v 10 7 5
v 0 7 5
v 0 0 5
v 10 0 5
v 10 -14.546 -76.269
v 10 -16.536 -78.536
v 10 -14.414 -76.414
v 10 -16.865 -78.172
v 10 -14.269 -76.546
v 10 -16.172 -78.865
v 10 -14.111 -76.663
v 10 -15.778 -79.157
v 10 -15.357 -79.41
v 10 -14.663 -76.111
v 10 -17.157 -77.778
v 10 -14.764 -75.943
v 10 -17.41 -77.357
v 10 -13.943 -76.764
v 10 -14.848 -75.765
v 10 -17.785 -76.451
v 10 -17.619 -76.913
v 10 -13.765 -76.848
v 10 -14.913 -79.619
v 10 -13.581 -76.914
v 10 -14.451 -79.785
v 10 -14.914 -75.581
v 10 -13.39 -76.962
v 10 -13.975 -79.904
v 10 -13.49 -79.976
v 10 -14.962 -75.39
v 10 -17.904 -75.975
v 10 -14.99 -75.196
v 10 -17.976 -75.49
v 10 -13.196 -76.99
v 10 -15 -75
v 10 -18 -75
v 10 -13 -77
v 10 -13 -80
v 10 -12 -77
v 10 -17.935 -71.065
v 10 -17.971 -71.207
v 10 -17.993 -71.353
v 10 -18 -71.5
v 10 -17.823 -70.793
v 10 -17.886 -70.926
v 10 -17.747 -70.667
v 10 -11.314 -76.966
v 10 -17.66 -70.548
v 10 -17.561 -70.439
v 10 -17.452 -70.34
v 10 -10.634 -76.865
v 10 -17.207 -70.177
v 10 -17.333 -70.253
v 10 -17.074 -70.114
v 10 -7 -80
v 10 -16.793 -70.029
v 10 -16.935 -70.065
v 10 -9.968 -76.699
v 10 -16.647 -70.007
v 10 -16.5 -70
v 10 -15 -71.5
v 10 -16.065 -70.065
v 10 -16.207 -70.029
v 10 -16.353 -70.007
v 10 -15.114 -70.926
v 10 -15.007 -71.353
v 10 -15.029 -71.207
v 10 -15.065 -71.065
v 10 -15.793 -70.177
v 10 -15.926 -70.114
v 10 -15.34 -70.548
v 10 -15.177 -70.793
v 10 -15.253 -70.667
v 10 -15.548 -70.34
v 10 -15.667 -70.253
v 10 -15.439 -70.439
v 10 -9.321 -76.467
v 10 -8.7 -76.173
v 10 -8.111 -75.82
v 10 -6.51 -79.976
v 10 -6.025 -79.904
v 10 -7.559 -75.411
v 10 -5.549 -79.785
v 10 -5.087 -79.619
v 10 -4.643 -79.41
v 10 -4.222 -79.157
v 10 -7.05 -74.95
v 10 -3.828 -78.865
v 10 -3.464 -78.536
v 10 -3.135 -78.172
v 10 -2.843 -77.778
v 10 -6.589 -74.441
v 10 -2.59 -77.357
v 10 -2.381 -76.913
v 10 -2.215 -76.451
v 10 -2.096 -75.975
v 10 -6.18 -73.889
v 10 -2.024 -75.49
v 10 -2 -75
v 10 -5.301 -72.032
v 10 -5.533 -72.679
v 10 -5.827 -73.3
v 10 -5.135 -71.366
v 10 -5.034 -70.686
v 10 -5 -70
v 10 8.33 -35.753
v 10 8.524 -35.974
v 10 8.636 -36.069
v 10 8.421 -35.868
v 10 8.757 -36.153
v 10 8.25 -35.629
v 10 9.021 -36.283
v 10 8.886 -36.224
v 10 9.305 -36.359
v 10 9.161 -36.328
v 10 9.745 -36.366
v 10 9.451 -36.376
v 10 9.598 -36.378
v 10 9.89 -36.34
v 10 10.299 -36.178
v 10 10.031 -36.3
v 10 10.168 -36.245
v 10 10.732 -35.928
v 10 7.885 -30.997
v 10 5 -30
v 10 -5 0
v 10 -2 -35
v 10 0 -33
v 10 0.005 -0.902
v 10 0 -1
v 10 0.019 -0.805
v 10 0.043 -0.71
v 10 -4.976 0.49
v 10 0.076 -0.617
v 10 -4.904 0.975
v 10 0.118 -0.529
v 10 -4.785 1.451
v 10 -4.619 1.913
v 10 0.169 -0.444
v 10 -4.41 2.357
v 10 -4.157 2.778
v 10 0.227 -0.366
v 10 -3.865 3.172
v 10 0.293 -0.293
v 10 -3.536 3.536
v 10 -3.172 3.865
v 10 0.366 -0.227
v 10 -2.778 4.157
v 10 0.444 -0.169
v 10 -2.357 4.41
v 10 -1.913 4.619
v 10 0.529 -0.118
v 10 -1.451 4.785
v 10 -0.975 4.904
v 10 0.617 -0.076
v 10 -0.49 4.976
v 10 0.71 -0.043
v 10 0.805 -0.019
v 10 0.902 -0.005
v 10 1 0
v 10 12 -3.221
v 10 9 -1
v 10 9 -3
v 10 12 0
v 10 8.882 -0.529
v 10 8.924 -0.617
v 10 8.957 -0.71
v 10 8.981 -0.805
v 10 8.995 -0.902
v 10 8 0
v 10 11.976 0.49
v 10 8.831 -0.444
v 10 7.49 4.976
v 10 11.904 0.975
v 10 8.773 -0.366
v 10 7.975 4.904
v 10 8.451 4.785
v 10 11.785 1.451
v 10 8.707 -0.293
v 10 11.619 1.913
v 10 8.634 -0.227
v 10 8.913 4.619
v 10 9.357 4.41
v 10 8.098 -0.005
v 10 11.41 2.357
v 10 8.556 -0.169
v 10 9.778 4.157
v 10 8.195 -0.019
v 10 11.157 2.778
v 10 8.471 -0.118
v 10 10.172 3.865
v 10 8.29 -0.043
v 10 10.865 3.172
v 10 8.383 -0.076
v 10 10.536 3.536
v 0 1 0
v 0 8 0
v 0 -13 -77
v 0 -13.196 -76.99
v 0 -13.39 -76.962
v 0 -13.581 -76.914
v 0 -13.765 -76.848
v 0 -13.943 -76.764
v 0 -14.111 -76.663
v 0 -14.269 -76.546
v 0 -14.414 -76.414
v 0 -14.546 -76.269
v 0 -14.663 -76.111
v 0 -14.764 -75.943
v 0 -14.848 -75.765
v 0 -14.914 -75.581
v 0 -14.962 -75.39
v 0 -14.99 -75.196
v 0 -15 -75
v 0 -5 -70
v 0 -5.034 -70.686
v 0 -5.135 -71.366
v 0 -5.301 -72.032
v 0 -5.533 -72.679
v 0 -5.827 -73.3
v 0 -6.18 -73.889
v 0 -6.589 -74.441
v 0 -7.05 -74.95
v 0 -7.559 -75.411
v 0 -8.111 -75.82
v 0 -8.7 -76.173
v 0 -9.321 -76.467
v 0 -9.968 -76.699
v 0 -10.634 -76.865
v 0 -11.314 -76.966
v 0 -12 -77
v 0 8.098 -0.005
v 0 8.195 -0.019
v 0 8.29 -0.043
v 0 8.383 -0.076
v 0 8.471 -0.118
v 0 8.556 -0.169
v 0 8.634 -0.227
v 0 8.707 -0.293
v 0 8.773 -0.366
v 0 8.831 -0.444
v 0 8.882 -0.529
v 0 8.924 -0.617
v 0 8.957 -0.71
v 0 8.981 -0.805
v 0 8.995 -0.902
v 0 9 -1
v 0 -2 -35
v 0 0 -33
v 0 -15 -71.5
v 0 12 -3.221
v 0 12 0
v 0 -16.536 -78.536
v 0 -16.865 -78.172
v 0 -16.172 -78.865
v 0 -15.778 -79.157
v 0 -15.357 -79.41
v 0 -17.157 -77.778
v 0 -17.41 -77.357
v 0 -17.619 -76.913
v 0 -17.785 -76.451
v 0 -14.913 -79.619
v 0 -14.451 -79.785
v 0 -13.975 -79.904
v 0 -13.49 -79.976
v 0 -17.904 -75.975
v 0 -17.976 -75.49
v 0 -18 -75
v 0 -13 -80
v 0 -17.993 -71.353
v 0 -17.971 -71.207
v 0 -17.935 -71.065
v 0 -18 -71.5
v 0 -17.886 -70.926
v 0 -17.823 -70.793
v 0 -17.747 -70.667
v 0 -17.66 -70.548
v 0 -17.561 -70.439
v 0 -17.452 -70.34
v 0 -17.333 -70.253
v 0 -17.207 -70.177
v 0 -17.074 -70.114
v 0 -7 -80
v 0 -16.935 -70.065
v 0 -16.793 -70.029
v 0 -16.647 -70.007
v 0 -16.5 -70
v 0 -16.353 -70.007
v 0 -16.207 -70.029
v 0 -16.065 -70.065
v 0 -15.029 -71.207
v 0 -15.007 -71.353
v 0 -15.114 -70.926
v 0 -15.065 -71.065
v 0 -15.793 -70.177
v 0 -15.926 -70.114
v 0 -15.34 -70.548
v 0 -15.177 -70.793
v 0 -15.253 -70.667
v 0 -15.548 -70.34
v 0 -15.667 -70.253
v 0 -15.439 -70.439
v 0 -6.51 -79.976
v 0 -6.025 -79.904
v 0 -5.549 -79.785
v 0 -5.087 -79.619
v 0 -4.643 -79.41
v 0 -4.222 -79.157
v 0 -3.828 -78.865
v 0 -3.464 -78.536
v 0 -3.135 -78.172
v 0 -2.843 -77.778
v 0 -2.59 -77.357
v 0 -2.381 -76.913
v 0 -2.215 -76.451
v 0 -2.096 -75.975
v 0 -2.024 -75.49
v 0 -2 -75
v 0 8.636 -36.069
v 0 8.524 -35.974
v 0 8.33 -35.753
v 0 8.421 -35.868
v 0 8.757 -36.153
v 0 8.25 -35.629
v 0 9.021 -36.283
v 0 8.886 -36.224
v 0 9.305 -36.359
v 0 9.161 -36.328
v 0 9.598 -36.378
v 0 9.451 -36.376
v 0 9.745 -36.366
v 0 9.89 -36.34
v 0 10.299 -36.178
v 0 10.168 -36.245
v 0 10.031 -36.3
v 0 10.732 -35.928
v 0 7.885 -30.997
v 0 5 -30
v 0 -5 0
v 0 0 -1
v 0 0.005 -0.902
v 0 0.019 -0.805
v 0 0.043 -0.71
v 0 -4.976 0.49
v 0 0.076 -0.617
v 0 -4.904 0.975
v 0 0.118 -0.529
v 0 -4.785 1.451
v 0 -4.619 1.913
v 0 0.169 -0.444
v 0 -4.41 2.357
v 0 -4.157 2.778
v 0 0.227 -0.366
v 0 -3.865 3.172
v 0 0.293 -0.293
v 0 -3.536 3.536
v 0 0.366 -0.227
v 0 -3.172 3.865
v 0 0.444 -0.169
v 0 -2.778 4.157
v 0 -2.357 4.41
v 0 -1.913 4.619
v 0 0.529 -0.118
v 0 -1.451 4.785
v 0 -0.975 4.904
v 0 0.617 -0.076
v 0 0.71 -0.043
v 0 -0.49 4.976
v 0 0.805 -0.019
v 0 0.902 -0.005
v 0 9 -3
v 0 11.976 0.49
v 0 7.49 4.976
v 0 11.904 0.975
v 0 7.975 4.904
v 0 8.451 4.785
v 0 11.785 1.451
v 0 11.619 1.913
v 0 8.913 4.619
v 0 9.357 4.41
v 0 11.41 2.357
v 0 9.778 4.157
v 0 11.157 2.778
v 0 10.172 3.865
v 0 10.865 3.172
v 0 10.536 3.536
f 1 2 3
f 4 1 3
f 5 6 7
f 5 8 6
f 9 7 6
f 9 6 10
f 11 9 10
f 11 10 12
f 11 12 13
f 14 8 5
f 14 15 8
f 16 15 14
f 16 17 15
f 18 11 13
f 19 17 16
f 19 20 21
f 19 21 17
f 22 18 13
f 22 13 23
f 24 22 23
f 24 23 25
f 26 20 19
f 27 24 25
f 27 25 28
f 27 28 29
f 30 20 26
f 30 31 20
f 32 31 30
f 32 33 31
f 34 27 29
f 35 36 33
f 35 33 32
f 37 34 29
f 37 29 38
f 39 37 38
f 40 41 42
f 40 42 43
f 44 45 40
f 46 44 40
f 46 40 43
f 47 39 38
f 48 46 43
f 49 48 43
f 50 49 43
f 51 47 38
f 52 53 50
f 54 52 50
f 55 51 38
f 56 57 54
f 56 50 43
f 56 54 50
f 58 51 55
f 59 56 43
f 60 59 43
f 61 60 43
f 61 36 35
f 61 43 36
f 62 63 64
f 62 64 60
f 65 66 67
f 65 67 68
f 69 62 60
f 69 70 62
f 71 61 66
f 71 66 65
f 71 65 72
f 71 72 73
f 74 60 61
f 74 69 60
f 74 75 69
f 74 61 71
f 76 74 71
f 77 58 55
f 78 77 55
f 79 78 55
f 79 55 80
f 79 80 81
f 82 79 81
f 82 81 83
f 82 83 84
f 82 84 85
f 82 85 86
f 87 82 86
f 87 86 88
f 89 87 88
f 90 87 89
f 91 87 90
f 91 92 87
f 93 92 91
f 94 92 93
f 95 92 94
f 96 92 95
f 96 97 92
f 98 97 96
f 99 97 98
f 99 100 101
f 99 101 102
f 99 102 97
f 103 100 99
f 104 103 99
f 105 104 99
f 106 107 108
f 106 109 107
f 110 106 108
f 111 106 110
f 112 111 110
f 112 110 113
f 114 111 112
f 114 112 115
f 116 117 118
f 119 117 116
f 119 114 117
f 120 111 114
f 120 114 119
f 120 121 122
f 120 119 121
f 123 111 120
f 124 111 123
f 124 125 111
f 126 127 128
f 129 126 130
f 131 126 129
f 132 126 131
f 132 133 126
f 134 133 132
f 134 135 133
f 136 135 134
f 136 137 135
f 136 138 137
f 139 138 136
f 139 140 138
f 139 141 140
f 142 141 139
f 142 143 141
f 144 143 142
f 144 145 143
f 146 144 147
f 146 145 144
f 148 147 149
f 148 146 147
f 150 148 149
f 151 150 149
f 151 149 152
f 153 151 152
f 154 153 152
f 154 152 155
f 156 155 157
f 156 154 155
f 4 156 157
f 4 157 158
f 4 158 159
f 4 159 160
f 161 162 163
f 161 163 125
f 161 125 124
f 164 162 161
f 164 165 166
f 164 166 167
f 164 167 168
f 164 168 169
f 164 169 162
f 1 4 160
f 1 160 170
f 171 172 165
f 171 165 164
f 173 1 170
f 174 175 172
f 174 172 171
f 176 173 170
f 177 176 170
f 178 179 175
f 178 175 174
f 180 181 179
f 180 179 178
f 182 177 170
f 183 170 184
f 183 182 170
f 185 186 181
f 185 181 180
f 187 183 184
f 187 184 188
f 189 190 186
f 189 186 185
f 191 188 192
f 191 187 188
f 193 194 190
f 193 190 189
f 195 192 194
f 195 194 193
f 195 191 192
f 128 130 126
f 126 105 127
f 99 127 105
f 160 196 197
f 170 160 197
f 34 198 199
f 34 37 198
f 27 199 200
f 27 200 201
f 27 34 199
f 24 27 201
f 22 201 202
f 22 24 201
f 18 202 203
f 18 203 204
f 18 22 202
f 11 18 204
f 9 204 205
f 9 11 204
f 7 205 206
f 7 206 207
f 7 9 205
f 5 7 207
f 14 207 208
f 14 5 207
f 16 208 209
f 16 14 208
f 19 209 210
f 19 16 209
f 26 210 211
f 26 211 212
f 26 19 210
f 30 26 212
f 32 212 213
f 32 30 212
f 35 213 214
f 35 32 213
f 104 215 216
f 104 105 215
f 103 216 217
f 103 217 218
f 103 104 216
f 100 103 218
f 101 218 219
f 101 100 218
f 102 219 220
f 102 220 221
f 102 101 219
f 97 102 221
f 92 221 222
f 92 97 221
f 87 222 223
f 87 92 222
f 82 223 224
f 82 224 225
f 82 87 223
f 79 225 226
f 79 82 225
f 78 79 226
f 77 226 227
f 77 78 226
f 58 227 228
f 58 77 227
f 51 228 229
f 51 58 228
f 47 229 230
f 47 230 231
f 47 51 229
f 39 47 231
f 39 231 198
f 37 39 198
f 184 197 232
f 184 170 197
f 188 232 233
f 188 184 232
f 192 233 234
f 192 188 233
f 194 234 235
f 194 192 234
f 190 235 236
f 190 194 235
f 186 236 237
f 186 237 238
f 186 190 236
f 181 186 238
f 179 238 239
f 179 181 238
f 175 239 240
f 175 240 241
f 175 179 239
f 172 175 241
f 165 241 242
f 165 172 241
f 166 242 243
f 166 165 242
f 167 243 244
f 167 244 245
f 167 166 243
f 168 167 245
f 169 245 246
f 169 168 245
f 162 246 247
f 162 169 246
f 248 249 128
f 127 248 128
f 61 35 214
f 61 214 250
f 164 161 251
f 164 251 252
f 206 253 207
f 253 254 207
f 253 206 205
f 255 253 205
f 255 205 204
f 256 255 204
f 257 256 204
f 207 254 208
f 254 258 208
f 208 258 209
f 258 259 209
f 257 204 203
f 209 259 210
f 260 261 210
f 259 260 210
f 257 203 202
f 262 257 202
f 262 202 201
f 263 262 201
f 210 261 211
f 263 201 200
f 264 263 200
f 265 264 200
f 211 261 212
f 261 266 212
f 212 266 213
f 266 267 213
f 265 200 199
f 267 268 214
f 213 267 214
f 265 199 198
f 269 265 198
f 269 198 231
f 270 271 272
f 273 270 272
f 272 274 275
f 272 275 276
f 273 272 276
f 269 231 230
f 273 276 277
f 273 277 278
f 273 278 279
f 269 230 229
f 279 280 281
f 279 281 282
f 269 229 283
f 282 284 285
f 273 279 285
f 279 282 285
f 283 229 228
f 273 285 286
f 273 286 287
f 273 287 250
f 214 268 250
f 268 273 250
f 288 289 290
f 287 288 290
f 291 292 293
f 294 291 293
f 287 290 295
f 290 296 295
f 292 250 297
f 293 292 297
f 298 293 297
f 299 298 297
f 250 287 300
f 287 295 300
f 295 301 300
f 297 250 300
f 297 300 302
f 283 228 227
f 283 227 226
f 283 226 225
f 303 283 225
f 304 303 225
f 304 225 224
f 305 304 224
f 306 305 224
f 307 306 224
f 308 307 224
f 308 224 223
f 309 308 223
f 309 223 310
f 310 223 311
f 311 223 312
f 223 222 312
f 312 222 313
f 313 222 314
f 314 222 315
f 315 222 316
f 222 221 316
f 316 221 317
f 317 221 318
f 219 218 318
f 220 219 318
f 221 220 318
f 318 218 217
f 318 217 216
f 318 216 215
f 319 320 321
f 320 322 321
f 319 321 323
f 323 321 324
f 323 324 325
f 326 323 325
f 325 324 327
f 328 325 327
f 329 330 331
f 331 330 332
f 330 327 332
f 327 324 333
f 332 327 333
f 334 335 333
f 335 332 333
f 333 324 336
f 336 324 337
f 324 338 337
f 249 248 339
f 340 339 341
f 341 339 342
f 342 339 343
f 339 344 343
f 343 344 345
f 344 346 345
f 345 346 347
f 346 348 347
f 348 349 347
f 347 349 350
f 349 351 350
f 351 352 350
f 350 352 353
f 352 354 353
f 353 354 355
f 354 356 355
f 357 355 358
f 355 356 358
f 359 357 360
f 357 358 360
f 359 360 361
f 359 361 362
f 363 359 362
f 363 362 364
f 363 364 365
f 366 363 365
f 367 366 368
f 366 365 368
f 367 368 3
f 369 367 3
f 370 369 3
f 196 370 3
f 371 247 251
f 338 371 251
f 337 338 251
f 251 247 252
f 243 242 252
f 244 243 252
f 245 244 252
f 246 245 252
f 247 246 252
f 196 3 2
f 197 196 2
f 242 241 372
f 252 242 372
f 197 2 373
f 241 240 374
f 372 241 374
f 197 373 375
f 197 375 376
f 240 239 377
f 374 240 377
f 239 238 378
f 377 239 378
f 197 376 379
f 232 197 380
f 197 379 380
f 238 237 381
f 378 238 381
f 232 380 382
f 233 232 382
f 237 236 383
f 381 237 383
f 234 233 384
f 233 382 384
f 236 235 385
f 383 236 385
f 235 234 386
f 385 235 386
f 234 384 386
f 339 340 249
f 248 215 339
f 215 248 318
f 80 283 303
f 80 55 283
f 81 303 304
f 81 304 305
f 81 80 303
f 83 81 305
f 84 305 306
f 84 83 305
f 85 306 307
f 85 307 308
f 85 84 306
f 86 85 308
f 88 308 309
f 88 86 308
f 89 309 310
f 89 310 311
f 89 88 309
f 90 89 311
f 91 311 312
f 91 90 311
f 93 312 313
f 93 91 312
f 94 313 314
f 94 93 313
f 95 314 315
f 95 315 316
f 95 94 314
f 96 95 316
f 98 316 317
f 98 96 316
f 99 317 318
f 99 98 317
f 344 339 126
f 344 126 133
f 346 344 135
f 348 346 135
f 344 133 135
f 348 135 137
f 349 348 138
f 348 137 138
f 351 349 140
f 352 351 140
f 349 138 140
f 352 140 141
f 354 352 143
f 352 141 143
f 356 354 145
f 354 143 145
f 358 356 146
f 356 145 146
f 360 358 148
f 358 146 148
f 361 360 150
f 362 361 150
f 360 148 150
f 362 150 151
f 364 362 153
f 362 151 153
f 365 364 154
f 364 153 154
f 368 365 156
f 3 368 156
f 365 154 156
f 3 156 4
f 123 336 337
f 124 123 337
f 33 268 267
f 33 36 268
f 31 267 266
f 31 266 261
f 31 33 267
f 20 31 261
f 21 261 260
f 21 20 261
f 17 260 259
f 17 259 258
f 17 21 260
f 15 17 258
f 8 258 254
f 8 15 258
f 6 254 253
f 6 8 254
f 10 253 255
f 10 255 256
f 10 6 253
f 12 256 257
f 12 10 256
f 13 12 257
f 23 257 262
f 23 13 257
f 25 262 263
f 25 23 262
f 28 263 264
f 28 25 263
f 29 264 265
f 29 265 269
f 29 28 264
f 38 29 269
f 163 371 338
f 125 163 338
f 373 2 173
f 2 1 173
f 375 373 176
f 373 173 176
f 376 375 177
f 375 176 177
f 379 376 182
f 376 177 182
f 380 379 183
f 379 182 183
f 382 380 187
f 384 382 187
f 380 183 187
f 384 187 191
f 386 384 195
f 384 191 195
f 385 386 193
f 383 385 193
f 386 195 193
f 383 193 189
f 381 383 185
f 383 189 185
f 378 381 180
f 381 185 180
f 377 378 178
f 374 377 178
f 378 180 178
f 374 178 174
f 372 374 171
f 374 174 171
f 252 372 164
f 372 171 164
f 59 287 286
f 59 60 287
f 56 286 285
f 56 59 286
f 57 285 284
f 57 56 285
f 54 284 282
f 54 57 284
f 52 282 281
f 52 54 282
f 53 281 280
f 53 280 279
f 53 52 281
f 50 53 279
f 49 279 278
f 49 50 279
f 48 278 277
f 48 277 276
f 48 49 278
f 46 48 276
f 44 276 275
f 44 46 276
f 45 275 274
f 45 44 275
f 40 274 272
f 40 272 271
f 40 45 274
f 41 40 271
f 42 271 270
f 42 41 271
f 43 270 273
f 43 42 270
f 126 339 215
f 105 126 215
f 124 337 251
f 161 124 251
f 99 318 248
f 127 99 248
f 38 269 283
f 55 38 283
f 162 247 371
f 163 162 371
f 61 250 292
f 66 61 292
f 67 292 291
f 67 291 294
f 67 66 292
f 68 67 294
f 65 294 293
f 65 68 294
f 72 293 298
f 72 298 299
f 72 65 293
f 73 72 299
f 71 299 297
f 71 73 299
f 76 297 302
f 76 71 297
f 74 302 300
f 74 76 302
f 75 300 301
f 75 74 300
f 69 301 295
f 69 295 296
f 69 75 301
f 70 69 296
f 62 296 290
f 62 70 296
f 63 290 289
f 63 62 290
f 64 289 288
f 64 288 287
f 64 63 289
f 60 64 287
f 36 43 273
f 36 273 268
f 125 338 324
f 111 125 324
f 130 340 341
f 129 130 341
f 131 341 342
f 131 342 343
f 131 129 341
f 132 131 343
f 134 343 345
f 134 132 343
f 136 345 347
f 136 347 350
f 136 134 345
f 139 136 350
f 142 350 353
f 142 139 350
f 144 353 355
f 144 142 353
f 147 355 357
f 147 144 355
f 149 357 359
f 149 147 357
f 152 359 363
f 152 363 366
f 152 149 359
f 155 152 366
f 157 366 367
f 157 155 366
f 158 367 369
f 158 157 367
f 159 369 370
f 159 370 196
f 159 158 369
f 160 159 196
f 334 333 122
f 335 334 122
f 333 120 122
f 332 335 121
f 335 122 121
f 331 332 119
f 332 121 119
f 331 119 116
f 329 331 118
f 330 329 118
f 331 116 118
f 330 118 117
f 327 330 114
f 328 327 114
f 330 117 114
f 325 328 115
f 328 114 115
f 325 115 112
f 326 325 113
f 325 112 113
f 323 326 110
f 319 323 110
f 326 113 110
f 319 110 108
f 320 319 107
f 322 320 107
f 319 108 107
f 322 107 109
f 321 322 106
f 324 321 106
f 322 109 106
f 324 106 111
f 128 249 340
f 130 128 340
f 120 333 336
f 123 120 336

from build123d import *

# Parameters (mm, degrees)
F1_DEPTH = 10
F2_R     = 7
F3_R     = 2
F4_R     = 5
F5_R     = 1.49999
F6_SIZE  = 1.99999
F7_R     = 1


# Not quite as in the source:
# - a fillet or chamfer is up to 0.001 mm smaller than in the source, because OpenCascade refuses the exact size


with BuildPart() as f1:
    # F0 (on Right) → F1 (new body)
    with BuildSketch(Plane.YZ):
        Polygon((0, -35), (0, 0), (9, 0), (9, -3), (5, -30), (9, -36.9282032303), (10.7320508076, -35.9282032303), (7.8850353118, -30.9970277416), (12, -3.2210160959), (12, 5), (-5, 5), (-5, -77), (-15, -77), (-15, -70), (-18, -70), (-18, -80), (-2, -80), (-2, -35), align=None)
    extrude(amount=F1_DEPTH)

    # F2
    f2_edges = [f1.edges().sort_by_distance(p)[0] for p in [
        (5, -5, -77),
    ]]
    fillet(f2_edges, radius=F2_R)

    # F3
    f3_edges = [f1.edges().sort_by_distance(p)[0] for p in [
        (5, -15, -77),
    ]]
    fillet(f3_edges, radius=F3_R)

    # F4
    f4_edges = [f1.edges().sort_by_distance(p)[0] for p in [
        (5, -5, 5),
        (5, 12, 5),
        (5, -18, -80),
        (5, -2, -80),
    ]]
    fillet(f4_edges, radius=F4_R)

    # F5 (radius 1.5 in the source; OpenCascade refuses exactly that, so slightly less here)
    f5_edges = [f1.edges().sort_by_distance(p)[0] for p in [
        (5, 9, -36.928203),
        (5, -18, -70),
        (5, -15, -70),
    ]]
    fillet(f5_edges, radius=F5_R)

    # F6 (size 2 in the source; OpenCascade refuses exactly that, so slightly less here)
    f6_edges = [f1.edges().sort_by_distance(p)[0] for p in [
        (5, 0, -35),
    ]]
    chamfer(f6_edges, length=F6_SIZE)

    # F7
    f7_edges = [f1.edges().sort_by_distance(p)[0] for p in [
        (5, 0, 0),
        (5, 9, 0),
    ]]
    fillet(f7_edges, radius=F7_R)


solid = f1.part
